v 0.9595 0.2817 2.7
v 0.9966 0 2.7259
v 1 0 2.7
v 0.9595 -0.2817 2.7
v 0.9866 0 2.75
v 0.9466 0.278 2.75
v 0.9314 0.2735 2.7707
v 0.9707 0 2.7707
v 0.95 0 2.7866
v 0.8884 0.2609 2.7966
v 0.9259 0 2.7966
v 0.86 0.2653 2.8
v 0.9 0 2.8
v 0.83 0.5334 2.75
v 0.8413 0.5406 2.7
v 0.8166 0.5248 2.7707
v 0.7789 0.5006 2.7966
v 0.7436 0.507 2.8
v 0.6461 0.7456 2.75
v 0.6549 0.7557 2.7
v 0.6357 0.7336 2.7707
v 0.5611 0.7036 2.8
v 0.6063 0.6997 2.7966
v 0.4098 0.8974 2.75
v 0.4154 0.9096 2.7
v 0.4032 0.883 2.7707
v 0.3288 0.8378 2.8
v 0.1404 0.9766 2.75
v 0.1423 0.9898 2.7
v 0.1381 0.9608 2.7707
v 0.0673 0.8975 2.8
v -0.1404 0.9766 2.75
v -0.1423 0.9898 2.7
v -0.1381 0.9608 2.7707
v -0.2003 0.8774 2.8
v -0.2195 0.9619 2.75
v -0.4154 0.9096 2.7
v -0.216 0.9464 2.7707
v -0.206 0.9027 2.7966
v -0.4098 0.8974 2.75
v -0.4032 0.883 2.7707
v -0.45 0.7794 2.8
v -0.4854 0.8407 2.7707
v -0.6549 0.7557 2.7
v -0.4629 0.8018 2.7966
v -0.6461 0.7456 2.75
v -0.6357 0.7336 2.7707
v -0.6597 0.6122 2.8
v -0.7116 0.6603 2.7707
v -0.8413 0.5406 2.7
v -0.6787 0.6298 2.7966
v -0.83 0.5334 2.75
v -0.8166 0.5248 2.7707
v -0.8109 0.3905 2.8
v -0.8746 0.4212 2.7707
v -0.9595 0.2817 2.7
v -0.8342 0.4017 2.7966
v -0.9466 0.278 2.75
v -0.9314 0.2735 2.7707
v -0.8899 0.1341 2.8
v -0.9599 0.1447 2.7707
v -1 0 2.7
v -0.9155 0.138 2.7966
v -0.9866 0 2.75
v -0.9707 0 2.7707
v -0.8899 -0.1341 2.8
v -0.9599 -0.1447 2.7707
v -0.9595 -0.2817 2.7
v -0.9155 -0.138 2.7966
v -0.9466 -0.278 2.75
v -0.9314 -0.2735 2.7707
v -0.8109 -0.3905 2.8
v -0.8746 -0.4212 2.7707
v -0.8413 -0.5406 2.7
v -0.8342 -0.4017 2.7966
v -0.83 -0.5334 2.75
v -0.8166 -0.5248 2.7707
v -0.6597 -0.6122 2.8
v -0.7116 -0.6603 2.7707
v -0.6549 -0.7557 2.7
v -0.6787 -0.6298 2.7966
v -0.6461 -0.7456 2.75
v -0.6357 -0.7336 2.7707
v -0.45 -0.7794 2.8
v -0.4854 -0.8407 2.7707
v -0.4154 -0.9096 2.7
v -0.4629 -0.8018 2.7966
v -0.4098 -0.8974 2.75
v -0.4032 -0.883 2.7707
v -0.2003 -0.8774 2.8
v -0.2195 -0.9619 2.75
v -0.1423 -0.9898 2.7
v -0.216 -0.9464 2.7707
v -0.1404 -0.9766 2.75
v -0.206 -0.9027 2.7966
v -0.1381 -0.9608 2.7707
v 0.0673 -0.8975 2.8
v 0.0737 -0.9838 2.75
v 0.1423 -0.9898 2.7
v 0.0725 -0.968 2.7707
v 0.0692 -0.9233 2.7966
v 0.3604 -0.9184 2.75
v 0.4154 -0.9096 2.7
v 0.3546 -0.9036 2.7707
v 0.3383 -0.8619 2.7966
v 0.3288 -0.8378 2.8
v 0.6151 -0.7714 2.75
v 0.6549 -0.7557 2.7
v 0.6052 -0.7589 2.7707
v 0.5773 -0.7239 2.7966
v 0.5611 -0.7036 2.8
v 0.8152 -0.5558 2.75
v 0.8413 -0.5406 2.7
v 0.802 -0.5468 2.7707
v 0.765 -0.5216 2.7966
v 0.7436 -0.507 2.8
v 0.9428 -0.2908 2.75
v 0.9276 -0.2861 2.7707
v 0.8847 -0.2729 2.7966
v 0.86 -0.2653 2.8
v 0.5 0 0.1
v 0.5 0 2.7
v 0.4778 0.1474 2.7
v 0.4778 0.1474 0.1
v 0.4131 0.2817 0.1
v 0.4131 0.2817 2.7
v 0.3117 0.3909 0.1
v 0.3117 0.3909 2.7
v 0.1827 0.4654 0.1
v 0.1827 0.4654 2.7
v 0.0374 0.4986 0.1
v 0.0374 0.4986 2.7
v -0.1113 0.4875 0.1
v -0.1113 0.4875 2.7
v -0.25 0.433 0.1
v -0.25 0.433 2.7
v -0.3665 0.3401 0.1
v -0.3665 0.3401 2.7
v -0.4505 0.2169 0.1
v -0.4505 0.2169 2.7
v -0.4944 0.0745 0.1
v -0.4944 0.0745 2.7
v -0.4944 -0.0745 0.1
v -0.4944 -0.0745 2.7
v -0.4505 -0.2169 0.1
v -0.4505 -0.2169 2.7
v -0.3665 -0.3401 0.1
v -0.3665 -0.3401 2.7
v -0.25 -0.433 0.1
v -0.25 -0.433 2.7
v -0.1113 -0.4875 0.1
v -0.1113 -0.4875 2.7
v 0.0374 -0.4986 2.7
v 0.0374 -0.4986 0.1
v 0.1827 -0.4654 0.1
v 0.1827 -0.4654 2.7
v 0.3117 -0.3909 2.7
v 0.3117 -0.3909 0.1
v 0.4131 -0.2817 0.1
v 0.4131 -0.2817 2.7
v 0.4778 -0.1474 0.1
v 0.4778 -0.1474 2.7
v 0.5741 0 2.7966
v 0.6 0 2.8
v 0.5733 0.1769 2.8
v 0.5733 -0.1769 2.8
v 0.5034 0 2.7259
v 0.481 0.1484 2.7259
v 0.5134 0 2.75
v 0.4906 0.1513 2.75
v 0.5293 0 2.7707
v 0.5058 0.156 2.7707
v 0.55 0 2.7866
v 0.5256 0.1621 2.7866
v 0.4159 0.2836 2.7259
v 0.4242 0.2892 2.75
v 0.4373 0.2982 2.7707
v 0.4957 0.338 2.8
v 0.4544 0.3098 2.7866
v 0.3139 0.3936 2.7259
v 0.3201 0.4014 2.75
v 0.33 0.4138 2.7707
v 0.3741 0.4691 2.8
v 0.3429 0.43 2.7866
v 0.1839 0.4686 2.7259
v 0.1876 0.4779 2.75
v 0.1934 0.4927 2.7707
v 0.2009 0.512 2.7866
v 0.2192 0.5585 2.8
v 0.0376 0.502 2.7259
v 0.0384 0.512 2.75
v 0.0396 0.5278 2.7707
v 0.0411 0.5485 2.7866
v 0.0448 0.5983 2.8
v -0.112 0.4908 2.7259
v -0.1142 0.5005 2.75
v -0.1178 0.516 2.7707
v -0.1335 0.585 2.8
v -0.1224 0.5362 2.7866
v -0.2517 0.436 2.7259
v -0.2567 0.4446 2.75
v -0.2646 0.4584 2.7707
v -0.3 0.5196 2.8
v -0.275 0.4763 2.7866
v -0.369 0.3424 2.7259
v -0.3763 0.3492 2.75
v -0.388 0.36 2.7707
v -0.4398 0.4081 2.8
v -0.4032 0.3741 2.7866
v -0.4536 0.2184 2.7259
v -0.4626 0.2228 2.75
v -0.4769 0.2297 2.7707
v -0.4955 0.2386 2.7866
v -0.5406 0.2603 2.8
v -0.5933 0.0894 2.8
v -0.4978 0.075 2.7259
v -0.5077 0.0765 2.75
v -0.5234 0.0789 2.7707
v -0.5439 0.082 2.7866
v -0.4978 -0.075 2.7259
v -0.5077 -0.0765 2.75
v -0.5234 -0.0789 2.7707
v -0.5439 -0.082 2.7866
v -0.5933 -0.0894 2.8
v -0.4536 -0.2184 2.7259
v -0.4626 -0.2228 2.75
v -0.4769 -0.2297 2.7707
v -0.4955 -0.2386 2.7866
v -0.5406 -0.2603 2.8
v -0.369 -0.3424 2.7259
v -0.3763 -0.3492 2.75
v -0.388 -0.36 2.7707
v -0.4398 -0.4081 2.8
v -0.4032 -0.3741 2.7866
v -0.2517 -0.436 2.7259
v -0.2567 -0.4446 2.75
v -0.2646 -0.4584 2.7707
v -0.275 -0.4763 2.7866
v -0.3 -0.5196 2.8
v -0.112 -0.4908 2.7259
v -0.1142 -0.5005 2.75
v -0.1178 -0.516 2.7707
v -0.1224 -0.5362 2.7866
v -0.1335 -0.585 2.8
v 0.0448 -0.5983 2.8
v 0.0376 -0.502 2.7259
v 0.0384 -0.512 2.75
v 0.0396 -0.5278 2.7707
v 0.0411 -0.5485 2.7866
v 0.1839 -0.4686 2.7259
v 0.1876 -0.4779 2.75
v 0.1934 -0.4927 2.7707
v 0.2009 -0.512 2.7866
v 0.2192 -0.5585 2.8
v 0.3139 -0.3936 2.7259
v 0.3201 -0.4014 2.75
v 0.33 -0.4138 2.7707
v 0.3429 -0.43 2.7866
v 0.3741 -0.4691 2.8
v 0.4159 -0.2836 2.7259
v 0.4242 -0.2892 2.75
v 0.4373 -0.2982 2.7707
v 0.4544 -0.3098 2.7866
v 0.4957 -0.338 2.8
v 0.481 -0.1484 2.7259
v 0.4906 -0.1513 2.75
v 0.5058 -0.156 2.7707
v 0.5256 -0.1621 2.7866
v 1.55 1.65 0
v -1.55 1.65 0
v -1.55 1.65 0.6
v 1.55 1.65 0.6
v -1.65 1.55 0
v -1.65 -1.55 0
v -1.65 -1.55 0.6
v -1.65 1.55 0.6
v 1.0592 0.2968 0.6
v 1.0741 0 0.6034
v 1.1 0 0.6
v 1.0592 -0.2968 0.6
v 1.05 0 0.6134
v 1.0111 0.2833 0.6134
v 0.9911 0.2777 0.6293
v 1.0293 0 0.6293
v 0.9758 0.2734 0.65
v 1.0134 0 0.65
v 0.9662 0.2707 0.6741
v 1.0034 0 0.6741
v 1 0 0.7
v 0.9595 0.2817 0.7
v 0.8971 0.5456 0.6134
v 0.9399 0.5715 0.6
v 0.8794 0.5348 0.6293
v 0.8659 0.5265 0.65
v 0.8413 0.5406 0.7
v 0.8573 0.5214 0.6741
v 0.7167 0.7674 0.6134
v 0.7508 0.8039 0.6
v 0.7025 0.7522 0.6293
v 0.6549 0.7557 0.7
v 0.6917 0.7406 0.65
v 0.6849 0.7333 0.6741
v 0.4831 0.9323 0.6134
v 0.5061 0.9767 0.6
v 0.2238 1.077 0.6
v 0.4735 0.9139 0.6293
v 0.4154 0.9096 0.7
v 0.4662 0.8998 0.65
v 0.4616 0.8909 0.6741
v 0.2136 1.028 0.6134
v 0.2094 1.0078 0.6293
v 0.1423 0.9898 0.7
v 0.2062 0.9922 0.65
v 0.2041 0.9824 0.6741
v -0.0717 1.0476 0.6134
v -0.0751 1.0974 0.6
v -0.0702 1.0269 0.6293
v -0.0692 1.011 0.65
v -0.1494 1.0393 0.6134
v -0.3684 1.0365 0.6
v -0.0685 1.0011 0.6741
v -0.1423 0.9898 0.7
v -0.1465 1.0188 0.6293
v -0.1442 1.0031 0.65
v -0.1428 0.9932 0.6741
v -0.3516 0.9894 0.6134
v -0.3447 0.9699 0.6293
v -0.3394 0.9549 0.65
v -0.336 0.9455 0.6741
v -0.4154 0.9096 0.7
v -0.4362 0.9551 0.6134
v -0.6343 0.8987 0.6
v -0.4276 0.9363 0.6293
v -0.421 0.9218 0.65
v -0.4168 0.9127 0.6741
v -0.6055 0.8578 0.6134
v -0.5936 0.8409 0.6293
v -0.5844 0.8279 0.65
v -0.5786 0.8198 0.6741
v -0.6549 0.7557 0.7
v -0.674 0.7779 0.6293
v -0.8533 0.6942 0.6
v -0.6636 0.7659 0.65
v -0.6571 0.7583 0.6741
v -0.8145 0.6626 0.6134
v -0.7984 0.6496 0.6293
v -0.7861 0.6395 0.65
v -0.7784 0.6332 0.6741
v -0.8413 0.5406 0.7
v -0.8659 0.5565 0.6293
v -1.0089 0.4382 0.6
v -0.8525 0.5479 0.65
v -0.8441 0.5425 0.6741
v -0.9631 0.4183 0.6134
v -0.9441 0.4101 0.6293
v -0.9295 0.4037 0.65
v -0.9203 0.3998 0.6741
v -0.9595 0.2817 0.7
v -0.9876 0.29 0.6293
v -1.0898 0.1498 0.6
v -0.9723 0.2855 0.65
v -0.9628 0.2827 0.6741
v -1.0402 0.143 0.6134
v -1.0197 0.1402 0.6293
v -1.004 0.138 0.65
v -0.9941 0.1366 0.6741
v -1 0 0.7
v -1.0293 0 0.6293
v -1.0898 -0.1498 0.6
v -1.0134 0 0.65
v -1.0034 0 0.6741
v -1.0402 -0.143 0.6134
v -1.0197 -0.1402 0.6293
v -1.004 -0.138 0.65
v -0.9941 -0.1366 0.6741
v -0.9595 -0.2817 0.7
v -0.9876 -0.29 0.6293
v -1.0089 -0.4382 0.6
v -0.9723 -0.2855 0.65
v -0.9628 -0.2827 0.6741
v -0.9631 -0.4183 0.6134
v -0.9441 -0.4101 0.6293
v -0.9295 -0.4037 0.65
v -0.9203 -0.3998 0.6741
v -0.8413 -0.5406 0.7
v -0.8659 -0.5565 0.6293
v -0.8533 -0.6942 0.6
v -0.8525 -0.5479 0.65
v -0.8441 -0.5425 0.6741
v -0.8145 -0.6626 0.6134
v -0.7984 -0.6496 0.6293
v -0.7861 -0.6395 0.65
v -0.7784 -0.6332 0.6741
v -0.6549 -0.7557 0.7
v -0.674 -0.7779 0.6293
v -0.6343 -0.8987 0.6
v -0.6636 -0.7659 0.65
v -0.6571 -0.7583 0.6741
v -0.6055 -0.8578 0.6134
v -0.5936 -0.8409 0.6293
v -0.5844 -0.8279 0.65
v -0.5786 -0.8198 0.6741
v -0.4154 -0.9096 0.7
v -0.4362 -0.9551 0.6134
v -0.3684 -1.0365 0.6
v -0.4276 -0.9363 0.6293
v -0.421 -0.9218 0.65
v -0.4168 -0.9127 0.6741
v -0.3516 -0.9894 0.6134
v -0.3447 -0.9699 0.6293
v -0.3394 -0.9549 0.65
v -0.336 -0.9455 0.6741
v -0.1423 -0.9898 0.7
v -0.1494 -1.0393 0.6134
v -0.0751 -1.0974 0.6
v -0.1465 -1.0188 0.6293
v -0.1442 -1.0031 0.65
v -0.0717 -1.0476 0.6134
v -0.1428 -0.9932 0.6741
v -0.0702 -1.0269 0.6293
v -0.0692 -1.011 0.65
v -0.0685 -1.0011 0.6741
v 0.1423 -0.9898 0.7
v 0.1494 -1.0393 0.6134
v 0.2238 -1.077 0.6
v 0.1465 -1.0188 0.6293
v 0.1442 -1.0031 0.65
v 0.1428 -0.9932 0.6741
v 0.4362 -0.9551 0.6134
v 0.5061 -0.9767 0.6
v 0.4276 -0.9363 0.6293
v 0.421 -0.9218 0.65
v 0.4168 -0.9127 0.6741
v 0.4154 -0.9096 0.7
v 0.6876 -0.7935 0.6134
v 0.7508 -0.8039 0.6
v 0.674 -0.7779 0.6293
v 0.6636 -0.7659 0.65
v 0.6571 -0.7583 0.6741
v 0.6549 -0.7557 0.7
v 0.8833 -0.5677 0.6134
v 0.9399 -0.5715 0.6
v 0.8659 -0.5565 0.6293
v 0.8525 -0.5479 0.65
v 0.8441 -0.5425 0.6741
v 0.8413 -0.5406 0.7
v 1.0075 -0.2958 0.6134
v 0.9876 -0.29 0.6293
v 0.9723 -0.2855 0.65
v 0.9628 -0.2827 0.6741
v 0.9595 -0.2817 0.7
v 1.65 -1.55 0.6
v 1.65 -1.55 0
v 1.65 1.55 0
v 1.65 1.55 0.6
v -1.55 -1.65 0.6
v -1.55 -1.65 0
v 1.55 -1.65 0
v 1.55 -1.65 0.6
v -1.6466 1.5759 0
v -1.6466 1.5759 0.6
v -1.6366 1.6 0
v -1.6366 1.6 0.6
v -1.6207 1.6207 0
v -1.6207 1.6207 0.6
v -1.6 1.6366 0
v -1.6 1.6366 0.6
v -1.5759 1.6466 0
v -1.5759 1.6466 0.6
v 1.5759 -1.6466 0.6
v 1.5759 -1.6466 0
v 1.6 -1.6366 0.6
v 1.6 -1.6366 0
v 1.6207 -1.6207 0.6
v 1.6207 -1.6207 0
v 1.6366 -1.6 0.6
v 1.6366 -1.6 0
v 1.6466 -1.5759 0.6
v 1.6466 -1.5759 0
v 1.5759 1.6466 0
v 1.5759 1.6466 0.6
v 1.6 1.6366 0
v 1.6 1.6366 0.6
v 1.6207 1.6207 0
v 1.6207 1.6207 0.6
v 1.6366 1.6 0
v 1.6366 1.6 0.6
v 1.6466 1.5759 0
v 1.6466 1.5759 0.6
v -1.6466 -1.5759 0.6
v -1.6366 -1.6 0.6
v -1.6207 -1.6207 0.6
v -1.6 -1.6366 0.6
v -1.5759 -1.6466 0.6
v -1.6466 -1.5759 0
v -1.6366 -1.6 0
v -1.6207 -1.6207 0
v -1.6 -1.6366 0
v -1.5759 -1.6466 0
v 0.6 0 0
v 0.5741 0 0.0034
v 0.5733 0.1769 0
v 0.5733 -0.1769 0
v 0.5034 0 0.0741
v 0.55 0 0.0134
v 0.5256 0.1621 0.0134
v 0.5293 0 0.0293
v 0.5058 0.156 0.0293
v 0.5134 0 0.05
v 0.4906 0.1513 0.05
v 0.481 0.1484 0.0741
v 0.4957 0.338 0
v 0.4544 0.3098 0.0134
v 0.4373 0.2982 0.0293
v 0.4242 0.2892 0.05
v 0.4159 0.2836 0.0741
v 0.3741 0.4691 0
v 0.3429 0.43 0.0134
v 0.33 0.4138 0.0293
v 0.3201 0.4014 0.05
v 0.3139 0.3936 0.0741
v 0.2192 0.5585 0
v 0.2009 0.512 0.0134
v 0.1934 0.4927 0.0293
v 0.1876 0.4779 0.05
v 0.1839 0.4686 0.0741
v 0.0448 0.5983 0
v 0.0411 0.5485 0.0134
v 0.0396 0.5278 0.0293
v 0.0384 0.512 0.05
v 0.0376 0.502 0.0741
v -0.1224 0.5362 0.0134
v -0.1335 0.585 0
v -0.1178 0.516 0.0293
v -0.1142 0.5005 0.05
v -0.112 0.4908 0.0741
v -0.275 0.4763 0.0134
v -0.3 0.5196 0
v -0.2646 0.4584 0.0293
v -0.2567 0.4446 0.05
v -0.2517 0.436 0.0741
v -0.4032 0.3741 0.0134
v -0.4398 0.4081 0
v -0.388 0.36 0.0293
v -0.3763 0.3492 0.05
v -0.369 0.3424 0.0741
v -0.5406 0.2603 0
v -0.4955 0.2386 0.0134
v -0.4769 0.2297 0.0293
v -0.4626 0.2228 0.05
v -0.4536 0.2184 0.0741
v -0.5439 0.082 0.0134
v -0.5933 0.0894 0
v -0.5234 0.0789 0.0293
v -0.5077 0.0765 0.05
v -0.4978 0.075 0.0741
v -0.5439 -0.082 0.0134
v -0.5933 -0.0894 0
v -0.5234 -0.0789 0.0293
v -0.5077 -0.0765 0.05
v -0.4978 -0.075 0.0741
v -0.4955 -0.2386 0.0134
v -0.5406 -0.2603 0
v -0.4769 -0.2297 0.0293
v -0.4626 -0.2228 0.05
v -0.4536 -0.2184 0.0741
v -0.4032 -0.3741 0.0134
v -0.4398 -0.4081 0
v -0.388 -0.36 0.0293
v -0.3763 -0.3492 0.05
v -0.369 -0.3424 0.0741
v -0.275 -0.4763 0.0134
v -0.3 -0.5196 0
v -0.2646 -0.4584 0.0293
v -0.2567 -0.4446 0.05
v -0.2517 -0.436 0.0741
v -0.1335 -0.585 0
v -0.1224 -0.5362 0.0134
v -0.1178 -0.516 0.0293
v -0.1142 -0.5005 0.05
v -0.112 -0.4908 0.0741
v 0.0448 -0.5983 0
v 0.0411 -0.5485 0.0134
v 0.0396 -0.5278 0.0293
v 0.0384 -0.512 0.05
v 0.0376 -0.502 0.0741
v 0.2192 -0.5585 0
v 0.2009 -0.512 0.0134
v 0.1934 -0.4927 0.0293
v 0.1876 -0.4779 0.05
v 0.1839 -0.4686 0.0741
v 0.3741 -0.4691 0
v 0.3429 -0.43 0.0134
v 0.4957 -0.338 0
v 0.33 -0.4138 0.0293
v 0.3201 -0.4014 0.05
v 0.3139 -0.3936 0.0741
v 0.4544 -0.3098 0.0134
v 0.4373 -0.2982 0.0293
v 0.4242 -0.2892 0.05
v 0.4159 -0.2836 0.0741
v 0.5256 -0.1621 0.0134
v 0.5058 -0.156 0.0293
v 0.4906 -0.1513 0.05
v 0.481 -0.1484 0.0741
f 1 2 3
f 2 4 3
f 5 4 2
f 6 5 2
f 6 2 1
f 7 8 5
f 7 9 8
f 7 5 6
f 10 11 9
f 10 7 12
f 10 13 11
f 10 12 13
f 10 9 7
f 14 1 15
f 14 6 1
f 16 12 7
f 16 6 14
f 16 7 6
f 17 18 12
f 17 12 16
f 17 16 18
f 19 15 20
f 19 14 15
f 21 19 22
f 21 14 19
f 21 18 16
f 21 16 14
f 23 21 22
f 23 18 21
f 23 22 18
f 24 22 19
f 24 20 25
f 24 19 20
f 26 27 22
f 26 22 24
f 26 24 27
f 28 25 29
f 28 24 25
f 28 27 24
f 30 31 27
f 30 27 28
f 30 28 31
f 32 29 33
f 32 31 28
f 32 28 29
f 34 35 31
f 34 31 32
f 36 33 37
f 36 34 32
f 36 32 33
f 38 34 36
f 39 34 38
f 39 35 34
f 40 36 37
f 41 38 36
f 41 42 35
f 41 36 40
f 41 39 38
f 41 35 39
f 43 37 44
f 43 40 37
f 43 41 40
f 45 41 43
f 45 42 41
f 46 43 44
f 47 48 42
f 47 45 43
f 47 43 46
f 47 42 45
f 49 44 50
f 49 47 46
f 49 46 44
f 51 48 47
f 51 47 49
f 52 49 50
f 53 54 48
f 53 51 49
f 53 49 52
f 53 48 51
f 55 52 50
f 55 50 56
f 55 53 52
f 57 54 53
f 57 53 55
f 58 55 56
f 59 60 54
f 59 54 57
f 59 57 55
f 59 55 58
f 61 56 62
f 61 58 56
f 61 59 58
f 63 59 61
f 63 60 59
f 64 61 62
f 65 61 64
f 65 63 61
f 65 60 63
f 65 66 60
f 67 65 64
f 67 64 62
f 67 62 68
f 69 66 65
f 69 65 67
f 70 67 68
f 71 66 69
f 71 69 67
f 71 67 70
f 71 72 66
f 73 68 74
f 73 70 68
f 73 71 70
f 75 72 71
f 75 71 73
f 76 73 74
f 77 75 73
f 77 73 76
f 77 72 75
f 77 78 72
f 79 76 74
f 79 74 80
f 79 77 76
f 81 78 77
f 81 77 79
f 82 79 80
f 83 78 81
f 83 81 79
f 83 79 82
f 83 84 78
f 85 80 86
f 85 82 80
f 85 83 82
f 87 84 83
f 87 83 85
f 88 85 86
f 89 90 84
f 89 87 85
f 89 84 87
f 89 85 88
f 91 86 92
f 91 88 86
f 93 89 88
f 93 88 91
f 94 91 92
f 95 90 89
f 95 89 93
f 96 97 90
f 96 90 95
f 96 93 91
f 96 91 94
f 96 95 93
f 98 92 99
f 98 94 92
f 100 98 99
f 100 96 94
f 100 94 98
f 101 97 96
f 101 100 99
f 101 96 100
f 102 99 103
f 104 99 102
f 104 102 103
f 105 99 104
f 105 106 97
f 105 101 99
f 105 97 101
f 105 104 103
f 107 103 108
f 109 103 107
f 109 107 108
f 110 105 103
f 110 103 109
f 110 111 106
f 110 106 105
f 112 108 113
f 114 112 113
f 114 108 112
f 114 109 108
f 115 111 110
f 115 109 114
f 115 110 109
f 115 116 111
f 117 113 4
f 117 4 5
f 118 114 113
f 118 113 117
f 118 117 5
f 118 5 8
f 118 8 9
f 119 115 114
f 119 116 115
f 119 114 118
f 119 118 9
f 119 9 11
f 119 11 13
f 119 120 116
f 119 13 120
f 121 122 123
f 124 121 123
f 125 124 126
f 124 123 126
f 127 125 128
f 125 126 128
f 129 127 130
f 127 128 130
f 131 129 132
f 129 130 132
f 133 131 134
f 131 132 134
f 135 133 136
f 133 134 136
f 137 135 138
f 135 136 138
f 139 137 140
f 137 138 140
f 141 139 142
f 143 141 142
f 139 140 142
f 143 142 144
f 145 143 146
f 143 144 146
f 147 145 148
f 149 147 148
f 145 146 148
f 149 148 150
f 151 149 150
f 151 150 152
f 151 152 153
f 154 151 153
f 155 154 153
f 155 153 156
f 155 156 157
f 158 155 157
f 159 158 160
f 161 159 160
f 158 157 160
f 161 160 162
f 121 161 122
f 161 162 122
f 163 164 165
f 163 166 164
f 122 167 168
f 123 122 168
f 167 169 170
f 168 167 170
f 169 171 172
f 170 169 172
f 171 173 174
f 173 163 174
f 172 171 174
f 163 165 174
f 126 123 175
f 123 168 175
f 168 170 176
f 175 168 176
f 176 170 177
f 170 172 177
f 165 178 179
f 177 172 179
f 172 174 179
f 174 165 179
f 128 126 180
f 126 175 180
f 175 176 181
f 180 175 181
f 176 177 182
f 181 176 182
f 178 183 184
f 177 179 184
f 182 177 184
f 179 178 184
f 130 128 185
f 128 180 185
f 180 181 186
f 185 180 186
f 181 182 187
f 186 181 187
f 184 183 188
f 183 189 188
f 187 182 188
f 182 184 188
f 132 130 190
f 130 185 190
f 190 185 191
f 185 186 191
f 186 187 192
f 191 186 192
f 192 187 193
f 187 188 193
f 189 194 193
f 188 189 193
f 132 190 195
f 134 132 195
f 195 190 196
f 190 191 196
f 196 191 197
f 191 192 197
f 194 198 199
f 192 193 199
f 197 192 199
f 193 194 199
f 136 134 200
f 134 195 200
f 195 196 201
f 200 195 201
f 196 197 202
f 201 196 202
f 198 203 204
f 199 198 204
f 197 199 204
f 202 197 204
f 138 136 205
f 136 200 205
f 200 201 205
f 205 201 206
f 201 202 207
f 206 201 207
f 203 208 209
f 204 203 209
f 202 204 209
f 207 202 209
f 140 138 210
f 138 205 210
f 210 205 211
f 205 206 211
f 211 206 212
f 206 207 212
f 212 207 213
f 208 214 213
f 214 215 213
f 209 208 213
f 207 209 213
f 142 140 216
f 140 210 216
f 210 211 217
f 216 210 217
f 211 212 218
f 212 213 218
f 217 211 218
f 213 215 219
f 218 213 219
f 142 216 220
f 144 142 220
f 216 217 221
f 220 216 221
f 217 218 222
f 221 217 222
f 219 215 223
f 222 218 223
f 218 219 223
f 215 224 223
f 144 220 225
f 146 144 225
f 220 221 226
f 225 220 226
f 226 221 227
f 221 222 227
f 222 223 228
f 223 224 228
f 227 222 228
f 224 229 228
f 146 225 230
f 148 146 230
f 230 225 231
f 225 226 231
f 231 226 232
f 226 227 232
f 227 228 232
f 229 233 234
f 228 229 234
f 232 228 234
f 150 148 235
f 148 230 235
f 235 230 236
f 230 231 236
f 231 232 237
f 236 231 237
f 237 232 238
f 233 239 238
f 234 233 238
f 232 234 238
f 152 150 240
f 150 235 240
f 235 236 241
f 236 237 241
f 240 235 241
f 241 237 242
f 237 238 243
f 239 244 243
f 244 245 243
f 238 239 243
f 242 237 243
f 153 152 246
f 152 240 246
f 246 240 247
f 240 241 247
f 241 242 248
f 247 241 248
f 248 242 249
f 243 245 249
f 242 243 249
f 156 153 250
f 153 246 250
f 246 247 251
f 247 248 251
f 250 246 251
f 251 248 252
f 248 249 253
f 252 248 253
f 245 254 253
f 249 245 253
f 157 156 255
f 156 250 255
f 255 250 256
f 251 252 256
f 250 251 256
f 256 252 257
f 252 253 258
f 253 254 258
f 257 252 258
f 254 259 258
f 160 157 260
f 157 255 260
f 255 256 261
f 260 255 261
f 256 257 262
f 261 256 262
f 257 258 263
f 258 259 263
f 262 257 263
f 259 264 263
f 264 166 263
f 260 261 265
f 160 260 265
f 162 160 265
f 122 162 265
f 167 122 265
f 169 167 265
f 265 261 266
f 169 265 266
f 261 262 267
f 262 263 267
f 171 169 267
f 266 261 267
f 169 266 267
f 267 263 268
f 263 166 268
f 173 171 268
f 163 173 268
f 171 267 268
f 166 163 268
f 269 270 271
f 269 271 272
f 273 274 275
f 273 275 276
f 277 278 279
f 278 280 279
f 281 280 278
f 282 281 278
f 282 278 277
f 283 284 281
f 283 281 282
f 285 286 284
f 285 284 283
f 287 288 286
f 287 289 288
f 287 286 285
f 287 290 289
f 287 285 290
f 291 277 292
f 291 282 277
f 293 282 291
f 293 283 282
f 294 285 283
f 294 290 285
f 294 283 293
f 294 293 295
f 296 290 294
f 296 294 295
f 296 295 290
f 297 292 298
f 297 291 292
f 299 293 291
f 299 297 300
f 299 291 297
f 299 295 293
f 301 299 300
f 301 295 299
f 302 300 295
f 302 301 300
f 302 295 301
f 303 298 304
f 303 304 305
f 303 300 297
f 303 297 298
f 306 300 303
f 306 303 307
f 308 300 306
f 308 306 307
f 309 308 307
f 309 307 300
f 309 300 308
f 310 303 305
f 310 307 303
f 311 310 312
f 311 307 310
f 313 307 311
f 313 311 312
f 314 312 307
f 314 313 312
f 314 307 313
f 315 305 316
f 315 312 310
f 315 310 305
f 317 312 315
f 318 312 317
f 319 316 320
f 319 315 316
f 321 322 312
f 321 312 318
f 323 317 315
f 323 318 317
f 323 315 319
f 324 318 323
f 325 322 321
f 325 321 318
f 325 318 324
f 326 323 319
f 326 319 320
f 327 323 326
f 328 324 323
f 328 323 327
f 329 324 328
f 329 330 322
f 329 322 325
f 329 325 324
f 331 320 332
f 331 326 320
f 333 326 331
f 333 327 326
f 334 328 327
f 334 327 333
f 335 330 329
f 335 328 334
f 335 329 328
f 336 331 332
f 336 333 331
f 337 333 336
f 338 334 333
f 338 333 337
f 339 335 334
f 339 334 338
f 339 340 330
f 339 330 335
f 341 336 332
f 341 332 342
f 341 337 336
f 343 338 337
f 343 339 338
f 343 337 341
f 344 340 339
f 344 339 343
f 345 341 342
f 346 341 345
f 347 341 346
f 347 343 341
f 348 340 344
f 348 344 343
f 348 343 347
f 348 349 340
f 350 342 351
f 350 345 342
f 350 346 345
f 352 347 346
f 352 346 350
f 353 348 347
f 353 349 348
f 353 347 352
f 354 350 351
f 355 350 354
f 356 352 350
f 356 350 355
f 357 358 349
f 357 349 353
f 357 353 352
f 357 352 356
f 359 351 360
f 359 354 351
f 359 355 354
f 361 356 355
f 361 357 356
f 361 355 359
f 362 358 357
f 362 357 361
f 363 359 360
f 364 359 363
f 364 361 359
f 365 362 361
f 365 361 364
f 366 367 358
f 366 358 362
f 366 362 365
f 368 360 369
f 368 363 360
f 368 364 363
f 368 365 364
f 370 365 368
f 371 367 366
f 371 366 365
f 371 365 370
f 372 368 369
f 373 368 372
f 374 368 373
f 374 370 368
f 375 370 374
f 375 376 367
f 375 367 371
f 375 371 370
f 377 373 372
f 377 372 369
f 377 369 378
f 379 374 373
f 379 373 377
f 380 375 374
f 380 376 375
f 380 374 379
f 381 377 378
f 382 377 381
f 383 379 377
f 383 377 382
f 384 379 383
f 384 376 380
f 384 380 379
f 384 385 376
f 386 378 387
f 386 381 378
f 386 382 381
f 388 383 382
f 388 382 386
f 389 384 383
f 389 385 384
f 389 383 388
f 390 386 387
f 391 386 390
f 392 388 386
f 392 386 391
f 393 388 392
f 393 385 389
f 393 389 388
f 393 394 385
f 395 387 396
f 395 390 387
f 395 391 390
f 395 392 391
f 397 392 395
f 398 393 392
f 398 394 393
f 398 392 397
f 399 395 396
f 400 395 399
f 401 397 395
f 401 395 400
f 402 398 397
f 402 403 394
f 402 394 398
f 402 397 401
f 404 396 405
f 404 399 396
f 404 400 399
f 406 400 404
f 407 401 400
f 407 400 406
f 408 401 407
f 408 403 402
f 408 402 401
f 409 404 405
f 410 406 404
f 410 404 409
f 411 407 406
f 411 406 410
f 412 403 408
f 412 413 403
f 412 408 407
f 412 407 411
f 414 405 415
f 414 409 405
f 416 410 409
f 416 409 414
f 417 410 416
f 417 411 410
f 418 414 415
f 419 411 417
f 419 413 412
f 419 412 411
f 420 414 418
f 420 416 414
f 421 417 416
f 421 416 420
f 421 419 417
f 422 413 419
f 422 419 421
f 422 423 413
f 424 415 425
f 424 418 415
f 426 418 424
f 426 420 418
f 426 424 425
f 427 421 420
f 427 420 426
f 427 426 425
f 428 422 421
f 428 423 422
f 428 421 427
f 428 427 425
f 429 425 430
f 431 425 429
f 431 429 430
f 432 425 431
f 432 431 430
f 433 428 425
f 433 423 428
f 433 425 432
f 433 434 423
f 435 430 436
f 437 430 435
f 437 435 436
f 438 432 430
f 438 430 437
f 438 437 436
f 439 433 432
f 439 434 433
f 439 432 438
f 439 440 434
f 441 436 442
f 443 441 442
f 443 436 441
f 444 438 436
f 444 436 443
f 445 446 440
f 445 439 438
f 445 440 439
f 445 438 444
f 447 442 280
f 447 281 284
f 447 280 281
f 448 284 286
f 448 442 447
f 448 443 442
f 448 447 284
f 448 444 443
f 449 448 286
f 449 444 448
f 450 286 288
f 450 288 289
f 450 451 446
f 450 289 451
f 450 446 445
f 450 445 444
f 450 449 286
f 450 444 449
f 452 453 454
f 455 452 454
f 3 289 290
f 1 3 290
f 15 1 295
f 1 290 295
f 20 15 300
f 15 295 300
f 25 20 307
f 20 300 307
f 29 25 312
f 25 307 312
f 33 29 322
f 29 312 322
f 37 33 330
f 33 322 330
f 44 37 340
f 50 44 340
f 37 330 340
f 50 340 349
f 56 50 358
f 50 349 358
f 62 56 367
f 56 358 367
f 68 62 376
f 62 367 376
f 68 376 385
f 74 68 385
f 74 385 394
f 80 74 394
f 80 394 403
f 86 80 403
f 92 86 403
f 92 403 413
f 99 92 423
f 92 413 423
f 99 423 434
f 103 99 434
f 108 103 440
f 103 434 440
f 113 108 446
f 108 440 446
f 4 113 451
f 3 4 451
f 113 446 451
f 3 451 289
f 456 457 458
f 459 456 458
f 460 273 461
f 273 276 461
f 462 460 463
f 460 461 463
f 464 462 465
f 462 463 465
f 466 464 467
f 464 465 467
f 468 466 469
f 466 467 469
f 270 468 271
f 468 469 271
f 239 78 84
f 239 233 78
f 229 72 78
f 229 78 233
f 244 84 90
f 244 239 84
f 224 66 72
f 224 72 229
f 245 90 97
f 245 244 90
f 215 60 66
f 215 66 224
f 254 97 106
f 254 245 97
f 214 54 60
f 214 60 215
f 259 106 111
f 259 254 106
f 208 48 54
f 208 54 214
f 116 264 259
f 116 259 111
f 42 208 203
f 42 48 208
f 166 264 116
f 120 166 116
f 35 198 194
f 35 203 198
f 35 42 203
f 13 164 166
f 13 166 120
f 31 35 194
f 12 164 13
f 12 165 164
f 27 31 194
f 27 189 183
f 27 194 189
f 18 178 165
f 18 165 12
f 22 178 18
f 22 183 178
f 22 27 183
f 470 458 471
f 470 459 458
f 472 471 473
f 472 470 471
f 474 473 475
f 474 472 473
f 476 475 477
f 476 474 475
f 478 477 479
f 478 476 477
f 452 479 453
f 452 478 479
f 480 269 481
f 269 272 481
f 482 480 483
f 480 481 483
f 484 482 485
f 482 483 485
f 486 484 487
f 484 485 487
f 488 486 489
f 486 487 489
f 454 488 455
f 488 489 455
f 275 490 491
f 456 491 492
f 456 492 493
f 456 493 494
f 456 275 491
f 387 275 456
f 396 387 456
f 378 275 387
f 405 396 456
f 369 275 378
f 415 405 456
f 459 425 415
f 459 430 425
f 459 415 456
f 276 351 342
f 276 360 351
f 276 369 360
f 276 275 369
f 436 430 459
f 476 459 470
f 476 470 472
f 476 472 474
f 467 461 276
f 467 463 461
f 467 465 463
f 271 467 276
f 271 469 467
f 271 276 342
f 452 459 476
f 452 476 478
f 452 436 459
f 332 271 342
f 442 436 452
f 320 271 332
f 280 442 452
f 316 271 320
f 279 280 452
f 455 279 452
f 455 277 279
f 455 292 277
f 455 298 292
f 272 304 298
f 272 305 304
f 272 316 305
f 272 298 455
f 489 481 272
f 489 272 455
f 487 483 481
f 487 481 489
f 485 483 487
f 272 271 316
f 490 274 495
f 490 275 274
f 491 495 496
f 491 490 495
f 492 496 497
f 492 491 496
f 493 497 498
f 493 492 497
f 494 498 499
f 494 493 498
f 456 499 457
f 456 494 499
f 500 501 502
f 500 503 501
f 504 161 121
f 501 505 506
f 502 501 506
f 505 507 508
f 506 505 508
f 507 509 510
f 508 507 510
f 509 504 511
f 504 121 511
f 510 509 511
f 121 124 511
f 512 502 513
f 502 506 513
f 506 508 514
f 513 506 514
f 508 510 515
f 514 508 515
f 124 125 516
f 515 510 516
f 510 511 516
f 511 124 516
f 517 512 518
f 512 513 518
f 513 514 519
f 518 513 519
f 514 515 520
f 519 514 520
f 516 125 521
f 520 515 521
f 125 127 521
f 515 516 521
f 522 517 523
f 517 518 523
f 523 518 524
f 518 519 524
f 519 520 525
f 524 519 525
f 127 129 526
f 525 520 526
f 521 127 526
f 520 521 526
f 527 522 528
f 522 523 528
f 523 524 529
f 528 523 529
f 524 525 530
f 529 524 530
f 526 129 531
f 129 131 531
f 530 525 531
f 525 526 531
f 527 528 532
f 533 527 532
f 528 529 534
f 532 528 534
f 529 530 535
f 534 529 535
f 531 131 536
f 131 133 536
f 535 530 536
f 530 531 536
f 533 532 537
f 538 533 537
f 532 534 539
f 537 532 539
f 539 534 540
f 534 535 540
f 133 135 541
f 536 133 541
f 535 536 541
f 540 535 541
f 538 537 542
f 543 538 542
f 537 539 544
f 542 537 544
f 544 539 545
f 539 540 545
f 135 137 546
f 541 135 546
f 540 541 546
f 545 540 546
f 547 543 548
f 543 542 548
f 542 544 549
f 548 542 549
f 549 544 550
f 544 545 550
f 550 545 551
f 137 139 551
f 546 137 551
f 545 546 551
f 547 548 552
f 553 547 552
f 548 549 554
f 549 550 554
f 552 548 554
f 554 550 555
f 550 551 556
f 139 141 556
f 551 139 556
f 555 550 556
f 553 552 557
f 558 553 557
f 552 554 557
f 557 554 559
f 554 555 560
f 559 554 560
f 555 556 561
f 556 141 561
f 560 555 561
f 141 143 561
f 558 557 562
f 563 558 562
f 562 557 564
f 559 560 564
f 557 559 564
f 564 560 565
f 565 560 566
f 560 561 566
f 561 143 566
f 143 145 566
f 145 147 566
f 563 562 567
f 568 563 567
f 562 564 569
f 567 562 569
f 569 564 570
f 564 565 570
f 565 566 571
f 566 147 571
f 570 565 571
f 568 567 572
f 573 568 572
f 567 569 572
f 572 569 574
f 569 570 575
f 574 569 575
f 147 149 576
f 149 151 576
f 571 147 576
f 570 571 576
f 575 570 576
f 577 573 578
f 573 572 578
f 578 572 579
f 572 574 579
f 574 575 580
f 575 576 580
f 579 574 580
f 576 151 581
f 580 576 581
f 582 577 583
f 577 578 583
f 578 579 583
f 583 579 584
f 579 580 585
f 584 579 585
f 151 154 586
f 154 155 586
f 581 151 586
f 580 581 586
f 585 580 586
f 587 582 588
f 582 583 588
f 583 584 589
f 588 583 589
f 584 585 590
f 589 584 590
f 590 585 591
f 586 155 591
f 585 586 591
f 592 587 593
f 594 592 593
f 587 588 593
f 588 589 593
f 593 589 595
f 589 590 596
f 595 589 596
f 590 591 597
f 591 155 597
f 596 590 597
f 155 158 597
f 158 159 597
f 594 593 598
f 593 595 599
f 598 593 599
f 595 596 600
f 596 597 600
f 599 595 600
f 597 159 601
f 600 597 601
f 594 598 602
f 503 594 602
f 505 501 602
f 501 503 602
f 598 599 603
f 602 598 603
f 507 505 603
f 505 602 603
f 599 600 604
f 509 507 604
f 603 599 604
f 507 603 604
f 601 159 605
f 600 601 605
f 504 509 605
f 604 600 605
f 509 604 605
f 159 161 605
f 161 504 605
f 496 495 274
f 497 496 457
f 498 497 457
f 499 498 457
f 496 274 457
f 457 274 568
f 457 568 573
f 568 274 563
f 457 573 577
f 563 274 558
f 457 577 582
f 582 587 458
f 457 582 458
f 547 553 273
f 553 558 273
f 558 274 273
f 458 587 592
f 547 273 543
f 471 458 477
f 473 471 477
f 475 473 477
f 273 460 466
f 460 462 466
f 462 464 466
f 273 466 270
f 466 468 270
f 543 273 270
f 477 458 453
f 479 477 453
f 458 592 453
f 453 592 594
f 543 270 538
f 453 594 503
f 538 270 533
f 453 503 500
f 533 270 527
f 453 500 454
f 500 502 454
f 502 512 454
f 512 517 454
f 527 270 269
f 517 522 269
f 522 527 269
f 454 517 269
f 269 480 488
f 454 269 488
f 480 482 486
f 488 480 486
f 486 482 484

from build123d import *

# Parameters (mm, degrees)
F0_W     = 3.3
F0_H     = 3.3
F1_DEPTH = 0.6
F2_R     = 1
F3_DEPTH = 2.2
F4_R     = 0.5
F5_DEPTH = 2.8
F6_R     = 0.1


with BuildPart() as f1:
    # F0 (on Top) → F1 (new body)
    with BuildSketch(Plane.XY):
        Rectangle(F0_W, F0_H)
    extrude(amount=F1_DEPTH)

    # F2 (on face) → F3 (join)
    with BuildSketch(Plane.XY.offset(0.6)):
        Circle(F2_R)
    extrude(amount=F3_DEPTH)

    # F4 (on face) → F5 (cut, through all)
    with BuildSketch(Plane.XY.offset(2.8)):
        Circle(F4_R)
    extrude(amount=-F5_DEPTH, mode=Mode.SUBTRACT)

    # F6
    f6_edges = [f1.edges().sort_by_distance(p)[0] for p in [
        (-1, 0, 2.8),
        (-0.5, 0, 2.8),
        (-1, 0, 0.6),
        (-1.65, -1.65, 0.3),
        (1.65, -1.65, 0.3),
        (-1.65, 1.65, 0.3),
        (1.65, 1.65, 0.3),
        (-0.5, 0, 0),
    ]]
    fillet(f6_edges, radius=F6_R)


solid = f1.part
